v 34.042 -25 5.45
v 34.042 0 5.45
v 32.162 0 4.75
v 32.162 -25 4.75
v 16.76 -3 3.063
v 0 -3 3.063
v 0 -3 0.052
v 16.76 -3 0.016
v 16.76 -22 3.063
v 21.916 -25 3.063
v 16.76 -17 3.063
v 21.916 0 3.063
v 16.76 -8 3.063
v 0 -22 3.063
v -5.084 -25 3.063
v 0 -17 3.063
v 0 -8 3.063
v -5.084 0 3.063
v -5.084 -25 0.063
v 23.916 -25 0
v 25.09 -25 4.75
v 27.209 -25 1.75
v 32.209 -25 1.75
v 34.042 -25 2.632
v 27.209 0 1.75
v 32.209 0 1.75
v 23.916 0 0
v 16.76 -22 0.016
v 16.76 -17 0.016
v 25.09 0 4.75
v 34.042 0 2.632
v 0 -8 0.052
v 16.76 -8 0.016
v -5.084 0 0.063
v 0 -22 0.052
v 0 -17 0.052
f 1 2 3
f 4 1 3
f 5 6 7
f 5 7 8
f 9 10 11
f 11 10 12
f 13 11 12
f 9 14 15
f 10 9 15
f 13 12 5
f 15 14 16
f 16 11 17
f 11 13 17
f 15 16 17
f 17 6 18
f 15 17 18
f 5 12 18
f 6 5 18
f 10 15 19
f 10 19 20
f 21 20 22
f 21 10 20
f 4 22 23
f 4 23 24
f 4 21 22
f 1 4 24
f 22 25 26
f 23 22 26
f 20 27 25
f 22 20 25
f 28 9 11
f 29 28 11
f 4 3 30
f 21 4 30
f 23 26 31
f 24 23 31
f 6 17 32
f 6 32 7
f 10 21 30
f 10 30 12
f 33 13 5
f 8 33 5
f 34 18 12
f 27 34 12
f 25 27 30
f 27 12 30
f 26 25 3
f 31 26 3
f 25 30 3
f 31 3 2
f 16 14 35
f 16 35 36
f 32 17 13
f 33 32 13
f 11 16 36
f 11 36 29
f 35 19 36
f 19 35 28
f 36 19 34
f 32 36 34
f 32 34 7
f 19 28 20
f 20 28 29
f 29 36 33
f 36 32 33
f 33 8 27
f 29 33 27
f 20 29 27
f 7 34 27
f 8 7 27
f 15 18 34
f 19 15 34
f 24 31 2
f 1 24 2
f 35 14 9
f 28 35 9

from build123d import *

# Parameters (mm, degrees)
F1_DEPTH = 25
F2_W     = 16.760172
F2_H     = 5
F3_DEPTH = 25


with BuildPart() as f1:
    # F0 (on Front) → F1 (new body)
    with BuildSketch(Plane.XZ):
        Polygon((21.915637, 3.063245), (-5.084363, 3.063245), (-5.084363, 0.063245), (23.915568, 0), (27.208995, 1.75), (32.208995, 1.75), (34.042088, 2.632186), (34.042088, 5.450061), (32.16216, 4.75), (25.09004, 4.75), align=None)
    extrude(amount=F1_DEPTH)

    # F2 (on face) → F3 (cut)
    with BuildSketch(Plane.XY.offset(3.063245)):
        with Locations((8.380086, -5.5)):
            Rectangle(F2_W, F2_H)
        with Locations((8.380086, -19.5)):
            Rectangle(F2_W, F2_H)
    extrude(amount=-F3_DEPTH, mode=Mode.SUBTRACT)


solid = f1.part
